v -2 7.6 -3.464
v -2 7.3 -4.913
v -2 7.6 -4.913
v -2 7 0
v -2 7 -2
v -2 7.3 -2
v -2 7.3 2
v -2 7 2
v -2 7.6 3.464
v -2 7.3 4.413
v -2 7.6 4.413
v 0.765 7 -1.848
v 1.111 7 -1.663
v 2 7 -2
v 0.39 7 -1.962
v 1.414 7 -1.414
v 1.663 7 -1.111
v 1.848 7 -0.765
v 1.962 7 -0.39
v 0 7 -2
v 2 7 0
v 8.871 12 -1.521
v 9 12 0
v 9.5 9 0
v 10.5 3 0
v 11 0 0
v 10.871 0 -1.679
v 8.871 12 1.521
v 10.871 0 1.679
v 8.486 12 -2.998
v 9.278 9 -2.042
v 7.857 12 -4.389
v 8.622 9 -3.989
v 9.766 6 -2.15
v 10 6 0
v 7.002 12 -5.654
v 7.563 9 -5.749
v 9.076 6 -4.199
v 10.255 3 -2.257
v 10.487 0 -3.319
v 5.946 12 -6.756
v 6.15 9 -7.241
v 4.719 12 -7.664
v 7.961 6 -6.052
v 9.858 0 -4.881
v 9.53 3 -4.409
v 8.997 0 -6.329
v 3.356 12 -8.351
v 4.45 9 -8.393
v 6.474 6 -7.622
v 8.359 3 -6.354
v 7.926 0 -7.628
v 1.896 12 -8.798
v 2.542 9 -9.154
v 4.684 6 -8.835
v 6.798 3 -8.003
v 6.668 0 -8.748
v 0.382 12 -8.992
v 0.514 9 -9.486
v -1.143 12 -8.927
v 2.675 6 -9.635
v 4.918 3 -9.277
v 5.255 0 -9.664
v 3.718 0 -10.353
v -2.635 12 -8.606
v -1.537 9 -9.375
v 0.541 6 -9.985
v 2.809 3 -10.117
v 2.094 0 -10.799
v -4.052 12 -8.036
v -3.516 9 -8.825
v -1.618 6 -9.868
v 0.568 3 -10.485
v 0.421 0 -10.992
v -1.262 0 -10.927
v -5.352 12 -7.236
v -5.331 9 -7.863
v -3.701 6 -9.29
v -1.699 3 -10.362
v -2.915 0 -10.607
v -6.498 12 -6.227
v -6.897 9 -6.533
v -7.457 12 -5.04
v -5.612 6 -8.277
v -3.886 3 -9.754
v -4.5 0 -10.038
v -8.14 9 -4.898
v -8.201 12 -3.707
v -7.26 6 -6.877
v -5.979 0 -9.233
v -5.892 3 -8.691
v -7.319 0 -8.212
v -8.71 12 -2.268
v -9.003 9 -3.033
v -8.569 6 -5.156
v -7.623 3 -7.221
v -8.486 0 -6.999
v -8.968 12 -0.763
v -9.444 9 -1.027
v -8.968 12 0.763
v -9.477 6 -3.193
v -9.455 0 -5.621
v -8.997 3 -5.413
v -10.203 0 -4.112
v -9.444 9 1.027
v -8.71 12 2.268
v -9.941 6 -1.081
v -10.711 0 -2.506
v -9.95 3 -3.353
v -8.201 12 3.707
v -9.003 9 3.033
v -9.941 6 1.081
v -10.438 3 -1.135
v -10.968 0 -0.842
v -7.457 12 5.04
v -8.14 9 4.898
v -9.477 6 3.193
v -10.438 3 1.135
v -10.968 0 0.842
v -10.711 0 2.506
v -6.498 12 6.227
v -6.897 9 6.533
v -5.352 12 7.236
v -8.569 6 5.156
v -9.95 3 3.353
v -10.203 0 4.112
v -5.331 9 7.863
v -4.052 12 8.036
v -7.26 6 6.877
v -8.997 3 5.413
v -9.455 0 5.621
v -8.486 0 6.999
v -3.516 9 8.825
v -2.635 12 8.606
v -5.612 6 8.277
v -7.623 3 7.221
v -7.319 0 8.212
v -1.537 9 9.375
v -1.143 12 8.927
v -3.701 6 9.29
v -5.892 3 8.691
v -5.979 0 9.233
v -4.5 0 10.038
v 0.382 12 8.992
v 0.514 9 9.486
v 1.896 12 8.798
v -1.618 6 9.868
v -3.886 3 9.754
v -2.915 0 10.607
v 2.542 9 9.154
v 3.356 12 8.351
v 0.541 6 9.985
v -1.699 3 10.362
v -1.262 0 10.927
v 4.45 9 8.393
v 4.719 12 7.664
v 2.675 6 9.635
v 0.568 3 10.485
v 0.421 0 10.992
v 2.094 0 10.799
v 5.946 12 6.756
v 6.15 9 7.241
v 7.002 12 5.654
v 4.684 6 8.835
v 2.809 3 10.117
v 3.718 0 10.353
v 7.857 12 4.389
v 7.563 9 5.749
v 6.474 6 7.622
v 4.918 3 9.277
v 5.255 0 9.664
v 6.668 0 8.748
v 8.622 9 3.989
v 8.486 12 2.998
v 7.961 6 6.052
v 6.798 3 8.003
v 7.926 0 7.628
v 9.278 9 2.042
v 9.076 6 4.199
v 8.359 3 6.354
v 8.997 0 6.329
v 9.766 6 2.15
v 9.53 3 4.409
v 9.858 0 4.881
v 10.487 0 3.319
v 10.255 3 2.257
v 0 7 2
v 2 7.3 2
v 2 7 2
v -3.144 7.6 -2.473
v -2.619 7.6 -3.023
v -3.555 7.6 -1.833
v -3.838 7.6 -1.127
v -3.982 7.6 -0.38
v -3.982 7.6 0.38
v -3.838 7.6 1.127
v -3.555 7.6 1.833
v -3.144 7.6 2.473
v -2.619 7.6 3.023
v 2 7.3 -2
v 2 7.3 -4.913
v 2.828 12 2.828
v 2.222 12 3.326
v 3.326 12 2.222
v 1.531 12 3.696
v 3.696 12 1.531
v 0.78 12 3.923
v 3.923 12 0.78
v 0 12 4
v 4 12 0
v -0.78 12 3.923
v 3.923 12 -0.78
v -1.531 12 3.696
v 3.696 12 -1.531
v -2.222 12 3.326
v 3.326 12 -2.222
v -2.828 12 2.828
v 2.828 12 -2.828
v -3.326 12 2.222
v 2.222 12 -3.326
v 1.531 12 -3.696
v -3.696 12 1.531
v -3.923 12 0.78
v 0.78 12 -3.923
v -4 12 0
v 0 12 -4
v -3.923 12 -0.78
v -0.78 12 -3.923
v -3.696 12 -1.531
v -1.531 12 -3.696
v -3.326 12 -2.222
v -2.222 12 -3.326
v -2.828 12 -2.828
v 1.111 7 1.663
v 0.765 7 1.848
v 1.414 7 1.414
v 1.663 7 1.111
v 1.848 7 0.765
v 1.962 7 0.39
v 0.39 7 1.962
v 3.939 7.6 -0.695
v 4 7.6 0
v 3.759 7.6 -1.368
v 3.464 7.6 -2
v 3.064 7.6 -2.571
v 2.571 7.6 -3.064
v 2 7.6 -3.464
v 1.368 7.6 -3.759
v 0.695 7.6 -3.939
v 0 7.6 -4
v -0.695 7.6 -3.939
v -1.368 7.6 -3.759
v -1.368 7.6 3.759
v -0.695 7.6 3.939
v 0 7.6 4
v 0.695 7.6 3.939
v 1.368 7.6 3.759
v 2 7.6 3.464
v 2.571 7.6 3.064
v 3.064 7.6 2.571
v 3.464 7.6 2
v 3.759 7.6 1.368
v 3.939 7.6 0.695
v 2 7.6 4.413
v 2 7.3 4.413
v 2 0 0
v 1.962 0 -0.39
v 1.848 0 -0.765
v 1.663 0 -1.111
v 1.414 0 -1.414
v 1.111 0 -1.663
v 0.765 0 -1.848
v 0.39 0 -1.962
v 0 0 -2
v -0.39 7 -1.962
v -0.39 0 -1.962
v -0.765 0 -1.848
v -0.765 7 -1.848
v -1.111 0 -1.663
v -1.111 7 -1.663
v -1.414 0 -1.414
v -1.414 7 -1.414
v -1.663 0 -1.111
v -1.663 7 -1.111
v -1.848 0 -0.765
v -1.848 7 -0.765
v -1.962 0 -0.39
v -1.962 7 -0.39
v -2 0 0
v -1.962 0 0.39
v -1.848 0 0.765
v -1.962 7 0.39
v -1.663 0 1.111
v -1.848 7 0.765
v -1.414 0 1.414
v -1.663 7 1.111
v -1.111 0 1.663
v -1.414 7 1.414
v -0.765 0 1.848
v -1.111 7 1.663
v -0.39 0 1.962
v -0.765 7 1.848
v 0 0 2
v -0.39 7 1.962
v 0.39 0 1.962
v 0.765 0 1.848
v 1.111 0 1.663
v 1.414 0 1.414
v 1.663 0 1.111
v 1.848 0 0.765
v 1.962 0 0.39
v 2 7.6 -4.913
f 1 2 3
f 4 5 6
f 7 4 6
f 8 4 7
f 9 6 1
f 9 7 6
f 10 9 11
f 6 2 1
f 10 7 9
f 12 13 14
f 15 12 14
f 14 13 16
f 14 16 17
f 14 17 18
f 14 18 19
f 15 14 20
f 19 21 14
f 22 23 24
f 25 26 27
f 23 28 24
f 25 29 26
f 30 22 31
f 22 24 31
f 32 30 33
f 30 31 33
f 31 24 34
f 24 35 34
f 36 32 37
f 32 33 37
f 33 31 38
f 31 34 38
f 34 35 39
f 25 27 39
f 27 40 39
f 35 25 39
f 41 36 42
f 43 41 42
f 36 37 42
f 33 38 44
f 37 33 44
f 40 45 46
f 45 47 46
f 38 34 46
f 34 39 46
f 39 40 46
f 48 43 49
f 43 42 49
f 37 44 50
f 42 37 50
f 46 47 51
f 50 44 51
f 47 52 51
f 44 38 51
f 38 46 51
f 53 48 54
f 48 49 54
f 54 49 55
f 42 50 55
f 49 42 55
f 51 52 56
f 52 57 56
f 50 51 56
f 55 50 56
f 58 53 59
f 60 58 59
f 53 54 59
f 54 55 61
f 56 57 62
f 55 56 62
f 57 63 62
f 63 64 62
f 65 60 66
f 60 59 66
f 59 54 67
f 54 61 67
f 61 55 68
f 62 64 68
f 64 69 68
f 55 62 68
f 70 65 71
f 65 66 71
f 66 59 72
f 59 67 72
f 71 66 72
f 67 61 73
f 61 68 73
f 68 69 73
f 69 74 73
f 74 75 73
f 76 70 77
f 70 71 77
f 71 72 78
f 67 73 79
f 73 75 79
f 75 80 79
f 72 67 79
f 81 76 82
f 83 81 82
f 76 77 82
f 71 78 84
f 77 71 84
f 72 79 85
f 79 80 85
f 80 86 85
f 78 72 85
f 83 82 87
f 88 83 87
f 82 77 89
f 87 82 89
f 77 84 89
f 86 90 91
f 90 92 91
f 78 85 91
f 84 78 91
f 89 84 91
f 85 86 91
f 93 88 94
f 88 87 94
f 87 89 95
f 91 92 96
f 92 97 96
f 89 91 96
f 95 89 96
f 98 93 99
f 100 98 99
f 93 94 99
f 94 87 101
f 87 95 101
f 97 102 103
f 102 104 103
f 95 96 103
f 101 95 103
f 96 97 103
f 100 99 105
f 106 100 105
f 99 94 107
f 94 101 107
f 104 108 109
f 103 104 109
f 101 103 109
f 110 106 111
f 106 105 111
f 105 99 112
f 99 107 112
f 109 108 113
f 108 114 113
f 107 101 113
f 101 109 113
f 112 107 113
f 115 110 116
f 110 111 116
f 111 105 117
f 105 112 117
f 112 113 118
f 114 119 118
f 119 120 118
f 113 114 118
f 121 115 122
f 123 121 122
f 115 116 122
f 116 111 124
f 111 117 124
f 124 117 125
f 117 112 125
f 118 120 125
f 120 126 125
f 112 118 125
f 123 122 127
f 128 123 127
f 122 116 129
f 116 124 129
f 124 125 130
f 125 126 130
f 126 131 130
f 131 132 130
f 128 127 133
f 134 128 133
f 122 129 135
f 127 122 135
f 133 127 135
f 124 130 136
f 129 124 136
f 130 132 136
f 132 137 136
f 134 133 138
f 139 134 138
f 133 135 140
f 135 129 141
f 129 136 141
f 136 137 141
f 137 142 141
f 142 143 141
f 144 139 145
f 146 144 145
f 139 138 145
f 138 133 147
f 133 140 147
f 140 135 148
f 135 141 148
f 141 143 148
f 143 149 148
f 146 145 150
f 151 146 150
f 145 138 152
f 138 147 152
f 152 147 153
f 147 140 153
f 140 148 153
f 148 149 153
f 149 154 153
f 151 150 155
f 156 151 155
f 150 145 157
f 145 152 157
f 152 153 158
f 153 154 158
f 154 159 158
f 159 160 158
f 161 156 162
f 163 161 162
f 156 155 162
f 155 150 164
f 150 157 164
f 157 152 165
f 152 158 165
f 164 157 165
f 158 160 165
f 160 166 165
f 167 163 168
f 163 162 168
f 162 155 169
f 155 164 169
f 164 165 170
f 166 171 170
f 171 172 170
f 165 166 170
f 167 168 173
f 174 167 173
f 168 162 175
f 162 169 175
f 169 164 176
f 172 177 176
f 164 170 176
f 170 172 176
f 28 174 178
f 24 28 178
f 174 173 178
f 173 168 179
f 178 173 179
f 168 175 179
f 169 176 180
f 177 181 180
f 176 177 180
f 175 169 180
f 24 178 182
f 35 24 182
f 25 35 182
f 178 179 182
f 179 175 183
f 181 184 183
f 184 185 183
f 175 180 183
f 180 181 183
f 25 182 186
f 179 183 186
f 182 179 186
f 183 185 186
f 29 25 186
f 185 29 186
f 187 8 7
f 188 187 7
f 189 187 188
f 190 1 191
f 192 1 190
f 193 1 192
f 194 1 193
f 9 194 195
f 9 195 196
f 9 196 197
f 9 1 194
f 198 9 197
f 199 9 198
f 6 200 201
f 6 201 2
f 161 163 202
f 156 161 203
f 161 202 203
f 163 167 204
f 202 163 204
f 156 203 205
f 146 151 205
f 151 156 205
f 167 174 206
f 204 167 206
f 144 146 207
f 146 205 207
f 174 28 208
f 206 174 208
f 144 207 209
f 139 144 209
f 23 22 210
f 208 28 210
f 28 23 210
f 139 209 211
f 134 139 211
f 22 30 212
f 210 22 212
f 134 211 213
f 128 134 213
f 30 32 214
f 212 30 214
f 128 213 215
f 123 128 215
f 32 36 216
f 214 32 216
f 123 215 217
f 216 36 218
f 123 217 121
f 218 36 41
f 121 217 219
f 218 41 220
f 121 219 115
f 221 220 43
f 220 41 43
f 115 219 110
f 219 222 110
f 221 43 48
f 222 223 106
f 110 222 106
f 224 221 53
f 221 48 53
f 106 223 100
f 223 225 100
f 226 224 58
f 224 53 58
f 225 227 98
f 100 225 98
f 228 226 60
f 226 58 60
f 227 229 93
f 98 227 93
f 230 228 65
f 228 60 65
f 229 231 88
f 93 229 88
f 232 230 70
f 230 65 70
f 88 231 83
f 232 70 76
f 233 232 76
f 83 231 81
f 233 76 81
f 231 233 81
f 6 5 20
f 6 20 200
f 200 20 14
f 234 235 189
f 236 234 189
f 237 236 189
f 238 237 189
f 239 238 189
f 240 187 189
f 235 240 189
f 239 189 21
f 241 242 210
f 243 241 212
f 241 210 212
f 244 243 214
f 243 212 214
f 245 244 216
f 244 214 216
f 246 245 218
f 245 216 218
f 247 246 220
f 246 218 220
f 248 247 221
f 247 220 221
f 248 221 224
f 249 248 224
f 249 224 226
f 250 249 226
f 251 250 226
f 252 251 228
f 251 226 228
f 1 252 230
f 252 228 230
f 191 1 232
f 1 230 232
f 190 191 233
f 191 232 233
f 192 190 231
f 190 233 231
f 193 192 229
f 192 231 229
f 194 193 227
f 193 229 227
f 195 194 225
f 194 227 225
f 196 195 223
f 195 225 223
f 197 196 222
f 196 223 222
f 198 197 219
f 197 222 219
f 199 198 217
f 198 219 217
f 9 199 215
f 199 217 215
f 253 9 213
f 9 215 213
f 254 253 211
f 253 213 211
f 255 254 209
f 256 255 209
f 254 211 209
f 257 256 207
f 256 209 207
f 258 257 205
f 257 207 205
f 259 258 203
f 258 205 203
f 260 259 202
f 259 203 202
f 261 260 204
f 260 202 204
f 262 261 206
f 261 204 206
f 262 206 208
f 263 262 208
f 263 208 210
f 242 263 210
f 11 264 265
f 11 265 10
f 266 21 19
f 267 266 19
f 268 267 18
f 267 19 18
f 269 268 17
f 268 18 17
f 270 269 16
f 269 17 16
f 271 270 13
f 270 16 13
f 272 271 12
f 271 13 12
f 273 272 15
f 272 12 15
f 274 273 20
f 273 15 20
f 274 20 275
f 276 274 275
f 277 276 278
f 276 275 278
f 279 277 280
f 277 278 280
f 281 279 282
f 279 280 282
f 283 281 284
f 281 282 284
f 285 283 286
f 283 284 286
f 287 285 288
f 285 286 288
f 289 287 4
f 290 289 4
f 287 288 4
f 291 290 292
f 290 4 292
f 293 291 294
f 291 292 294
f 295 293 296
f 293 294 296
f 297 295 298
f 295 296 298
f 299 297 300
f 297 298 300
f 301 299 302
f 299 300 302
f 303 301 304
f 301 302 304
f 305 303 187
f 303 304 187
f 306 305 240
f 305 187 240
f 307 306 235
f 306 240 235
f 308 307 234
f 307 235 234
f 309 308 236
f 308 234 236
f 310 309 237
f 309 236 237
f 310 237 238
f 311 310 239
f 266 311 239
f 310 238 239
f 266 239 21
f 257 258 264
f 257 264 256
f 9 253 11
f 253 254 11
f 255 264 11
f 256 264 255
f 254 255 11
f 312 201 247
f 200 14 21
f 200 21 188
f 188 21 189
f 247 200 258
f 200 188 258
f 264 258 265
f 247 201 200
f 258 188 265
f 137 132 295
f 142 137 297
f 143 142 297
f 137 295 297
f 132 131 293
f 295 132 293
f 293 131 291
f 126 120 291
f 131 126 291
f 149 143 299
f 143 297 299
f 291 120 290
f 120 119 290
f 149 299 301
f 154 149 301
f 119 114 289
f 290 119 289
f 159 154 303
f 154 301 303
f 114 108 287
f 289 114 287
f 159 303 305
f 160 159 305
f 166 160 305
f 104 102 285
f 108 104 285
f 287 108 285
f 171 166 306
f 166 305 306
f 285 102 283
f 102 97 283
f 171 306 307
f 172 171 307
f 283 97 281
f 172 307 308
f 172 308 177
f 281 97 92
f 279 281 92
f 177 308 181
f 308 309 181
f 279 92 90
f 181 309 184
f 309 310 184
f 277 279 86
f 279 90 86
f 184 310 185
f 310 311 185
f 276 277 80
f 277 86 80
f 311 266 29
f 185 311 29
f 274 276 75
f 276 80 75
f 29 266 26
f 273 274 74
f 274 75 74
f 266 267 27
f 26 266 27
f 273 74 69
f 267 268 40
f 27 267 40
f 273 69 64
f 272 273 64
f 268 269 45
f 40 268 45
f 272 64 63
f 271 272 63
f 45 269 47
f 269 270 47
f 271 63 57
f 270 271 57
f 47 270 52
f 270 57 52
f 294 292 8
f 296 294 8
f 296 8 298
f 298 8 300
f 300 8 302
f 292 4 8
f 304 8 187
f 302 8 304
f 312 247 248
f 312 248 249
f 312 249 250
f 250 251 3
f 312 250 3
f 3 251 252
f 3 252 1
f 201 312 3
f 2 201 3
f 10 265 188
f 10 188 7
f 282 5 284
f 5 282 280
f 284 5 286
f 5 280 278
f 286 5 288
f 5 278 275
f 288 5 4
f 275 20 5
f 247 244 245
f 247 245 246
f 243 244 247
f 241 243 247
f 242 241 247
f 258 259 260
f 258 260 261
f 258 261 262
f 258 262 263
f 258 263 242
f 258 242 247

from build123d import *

# Parameters (mm, degrees)
SKETCH001_W     = 9.016991
SKETCH001_H     = 9.88356
PAD_DEPTH       = 0.6
SKETCH002_W     = 4
SKETCH002_H     = 9.325613
POCKET_DEPTH    = 0.3
SKETCH003_W     = 4
SKETCH003_H     = 4
POCKET001_DEPTH = 0.3


with BuildPart() as part:
    # Sketch → Revolution (revolve)
    with BuildSketch(Plane.XY):
        Polygon((2, 7), (4, 7), (4, 12), (9, 12), (11, 0), (2, 0), align=None)
    revolve(axis=Axis((0, 0, 0), (0, 1, 0)))

    # Sketch001 (on Face1 of Revolution) → Pad (new body)
    with BuildSketch(Plane(origin=(0, 7, 0), x_dir=(-1, 0, 0), z_dir=(0, 1, 0))):
        with Locations((0.148778, -0.086759)):
            Rectangle(SKETCH001_W, SKETCH001_H)
    extrude(amount=PAD_DEPTH)

    # Sketch002 (on Face7 of Pad) → Pocket (cut)
    with BuildSketch(Plane(origin=(0, 7.6, 0), x_dir=(-1, 0, 0), z_dir=(0, 1, 0))):
        with Locations((0, -0.25022)):
            Rectangle(SKETCH002_W, SKETCH002_H)
    extrude(amount=-POCKET_DEPTH, mode=Mode.SUBTRACT)

    # Sketch003 (on Face3 of Pocket) → Pocket001 (cut)
    with BuildSketch(Plane.XZ.offset(-7)):
        Rectangle(SKETCH003_W, SKETCH003_H)
    extrude(amount=-POCKET001_DEPTH, mode=Mode.SUBTRACT)


solid = part.part
